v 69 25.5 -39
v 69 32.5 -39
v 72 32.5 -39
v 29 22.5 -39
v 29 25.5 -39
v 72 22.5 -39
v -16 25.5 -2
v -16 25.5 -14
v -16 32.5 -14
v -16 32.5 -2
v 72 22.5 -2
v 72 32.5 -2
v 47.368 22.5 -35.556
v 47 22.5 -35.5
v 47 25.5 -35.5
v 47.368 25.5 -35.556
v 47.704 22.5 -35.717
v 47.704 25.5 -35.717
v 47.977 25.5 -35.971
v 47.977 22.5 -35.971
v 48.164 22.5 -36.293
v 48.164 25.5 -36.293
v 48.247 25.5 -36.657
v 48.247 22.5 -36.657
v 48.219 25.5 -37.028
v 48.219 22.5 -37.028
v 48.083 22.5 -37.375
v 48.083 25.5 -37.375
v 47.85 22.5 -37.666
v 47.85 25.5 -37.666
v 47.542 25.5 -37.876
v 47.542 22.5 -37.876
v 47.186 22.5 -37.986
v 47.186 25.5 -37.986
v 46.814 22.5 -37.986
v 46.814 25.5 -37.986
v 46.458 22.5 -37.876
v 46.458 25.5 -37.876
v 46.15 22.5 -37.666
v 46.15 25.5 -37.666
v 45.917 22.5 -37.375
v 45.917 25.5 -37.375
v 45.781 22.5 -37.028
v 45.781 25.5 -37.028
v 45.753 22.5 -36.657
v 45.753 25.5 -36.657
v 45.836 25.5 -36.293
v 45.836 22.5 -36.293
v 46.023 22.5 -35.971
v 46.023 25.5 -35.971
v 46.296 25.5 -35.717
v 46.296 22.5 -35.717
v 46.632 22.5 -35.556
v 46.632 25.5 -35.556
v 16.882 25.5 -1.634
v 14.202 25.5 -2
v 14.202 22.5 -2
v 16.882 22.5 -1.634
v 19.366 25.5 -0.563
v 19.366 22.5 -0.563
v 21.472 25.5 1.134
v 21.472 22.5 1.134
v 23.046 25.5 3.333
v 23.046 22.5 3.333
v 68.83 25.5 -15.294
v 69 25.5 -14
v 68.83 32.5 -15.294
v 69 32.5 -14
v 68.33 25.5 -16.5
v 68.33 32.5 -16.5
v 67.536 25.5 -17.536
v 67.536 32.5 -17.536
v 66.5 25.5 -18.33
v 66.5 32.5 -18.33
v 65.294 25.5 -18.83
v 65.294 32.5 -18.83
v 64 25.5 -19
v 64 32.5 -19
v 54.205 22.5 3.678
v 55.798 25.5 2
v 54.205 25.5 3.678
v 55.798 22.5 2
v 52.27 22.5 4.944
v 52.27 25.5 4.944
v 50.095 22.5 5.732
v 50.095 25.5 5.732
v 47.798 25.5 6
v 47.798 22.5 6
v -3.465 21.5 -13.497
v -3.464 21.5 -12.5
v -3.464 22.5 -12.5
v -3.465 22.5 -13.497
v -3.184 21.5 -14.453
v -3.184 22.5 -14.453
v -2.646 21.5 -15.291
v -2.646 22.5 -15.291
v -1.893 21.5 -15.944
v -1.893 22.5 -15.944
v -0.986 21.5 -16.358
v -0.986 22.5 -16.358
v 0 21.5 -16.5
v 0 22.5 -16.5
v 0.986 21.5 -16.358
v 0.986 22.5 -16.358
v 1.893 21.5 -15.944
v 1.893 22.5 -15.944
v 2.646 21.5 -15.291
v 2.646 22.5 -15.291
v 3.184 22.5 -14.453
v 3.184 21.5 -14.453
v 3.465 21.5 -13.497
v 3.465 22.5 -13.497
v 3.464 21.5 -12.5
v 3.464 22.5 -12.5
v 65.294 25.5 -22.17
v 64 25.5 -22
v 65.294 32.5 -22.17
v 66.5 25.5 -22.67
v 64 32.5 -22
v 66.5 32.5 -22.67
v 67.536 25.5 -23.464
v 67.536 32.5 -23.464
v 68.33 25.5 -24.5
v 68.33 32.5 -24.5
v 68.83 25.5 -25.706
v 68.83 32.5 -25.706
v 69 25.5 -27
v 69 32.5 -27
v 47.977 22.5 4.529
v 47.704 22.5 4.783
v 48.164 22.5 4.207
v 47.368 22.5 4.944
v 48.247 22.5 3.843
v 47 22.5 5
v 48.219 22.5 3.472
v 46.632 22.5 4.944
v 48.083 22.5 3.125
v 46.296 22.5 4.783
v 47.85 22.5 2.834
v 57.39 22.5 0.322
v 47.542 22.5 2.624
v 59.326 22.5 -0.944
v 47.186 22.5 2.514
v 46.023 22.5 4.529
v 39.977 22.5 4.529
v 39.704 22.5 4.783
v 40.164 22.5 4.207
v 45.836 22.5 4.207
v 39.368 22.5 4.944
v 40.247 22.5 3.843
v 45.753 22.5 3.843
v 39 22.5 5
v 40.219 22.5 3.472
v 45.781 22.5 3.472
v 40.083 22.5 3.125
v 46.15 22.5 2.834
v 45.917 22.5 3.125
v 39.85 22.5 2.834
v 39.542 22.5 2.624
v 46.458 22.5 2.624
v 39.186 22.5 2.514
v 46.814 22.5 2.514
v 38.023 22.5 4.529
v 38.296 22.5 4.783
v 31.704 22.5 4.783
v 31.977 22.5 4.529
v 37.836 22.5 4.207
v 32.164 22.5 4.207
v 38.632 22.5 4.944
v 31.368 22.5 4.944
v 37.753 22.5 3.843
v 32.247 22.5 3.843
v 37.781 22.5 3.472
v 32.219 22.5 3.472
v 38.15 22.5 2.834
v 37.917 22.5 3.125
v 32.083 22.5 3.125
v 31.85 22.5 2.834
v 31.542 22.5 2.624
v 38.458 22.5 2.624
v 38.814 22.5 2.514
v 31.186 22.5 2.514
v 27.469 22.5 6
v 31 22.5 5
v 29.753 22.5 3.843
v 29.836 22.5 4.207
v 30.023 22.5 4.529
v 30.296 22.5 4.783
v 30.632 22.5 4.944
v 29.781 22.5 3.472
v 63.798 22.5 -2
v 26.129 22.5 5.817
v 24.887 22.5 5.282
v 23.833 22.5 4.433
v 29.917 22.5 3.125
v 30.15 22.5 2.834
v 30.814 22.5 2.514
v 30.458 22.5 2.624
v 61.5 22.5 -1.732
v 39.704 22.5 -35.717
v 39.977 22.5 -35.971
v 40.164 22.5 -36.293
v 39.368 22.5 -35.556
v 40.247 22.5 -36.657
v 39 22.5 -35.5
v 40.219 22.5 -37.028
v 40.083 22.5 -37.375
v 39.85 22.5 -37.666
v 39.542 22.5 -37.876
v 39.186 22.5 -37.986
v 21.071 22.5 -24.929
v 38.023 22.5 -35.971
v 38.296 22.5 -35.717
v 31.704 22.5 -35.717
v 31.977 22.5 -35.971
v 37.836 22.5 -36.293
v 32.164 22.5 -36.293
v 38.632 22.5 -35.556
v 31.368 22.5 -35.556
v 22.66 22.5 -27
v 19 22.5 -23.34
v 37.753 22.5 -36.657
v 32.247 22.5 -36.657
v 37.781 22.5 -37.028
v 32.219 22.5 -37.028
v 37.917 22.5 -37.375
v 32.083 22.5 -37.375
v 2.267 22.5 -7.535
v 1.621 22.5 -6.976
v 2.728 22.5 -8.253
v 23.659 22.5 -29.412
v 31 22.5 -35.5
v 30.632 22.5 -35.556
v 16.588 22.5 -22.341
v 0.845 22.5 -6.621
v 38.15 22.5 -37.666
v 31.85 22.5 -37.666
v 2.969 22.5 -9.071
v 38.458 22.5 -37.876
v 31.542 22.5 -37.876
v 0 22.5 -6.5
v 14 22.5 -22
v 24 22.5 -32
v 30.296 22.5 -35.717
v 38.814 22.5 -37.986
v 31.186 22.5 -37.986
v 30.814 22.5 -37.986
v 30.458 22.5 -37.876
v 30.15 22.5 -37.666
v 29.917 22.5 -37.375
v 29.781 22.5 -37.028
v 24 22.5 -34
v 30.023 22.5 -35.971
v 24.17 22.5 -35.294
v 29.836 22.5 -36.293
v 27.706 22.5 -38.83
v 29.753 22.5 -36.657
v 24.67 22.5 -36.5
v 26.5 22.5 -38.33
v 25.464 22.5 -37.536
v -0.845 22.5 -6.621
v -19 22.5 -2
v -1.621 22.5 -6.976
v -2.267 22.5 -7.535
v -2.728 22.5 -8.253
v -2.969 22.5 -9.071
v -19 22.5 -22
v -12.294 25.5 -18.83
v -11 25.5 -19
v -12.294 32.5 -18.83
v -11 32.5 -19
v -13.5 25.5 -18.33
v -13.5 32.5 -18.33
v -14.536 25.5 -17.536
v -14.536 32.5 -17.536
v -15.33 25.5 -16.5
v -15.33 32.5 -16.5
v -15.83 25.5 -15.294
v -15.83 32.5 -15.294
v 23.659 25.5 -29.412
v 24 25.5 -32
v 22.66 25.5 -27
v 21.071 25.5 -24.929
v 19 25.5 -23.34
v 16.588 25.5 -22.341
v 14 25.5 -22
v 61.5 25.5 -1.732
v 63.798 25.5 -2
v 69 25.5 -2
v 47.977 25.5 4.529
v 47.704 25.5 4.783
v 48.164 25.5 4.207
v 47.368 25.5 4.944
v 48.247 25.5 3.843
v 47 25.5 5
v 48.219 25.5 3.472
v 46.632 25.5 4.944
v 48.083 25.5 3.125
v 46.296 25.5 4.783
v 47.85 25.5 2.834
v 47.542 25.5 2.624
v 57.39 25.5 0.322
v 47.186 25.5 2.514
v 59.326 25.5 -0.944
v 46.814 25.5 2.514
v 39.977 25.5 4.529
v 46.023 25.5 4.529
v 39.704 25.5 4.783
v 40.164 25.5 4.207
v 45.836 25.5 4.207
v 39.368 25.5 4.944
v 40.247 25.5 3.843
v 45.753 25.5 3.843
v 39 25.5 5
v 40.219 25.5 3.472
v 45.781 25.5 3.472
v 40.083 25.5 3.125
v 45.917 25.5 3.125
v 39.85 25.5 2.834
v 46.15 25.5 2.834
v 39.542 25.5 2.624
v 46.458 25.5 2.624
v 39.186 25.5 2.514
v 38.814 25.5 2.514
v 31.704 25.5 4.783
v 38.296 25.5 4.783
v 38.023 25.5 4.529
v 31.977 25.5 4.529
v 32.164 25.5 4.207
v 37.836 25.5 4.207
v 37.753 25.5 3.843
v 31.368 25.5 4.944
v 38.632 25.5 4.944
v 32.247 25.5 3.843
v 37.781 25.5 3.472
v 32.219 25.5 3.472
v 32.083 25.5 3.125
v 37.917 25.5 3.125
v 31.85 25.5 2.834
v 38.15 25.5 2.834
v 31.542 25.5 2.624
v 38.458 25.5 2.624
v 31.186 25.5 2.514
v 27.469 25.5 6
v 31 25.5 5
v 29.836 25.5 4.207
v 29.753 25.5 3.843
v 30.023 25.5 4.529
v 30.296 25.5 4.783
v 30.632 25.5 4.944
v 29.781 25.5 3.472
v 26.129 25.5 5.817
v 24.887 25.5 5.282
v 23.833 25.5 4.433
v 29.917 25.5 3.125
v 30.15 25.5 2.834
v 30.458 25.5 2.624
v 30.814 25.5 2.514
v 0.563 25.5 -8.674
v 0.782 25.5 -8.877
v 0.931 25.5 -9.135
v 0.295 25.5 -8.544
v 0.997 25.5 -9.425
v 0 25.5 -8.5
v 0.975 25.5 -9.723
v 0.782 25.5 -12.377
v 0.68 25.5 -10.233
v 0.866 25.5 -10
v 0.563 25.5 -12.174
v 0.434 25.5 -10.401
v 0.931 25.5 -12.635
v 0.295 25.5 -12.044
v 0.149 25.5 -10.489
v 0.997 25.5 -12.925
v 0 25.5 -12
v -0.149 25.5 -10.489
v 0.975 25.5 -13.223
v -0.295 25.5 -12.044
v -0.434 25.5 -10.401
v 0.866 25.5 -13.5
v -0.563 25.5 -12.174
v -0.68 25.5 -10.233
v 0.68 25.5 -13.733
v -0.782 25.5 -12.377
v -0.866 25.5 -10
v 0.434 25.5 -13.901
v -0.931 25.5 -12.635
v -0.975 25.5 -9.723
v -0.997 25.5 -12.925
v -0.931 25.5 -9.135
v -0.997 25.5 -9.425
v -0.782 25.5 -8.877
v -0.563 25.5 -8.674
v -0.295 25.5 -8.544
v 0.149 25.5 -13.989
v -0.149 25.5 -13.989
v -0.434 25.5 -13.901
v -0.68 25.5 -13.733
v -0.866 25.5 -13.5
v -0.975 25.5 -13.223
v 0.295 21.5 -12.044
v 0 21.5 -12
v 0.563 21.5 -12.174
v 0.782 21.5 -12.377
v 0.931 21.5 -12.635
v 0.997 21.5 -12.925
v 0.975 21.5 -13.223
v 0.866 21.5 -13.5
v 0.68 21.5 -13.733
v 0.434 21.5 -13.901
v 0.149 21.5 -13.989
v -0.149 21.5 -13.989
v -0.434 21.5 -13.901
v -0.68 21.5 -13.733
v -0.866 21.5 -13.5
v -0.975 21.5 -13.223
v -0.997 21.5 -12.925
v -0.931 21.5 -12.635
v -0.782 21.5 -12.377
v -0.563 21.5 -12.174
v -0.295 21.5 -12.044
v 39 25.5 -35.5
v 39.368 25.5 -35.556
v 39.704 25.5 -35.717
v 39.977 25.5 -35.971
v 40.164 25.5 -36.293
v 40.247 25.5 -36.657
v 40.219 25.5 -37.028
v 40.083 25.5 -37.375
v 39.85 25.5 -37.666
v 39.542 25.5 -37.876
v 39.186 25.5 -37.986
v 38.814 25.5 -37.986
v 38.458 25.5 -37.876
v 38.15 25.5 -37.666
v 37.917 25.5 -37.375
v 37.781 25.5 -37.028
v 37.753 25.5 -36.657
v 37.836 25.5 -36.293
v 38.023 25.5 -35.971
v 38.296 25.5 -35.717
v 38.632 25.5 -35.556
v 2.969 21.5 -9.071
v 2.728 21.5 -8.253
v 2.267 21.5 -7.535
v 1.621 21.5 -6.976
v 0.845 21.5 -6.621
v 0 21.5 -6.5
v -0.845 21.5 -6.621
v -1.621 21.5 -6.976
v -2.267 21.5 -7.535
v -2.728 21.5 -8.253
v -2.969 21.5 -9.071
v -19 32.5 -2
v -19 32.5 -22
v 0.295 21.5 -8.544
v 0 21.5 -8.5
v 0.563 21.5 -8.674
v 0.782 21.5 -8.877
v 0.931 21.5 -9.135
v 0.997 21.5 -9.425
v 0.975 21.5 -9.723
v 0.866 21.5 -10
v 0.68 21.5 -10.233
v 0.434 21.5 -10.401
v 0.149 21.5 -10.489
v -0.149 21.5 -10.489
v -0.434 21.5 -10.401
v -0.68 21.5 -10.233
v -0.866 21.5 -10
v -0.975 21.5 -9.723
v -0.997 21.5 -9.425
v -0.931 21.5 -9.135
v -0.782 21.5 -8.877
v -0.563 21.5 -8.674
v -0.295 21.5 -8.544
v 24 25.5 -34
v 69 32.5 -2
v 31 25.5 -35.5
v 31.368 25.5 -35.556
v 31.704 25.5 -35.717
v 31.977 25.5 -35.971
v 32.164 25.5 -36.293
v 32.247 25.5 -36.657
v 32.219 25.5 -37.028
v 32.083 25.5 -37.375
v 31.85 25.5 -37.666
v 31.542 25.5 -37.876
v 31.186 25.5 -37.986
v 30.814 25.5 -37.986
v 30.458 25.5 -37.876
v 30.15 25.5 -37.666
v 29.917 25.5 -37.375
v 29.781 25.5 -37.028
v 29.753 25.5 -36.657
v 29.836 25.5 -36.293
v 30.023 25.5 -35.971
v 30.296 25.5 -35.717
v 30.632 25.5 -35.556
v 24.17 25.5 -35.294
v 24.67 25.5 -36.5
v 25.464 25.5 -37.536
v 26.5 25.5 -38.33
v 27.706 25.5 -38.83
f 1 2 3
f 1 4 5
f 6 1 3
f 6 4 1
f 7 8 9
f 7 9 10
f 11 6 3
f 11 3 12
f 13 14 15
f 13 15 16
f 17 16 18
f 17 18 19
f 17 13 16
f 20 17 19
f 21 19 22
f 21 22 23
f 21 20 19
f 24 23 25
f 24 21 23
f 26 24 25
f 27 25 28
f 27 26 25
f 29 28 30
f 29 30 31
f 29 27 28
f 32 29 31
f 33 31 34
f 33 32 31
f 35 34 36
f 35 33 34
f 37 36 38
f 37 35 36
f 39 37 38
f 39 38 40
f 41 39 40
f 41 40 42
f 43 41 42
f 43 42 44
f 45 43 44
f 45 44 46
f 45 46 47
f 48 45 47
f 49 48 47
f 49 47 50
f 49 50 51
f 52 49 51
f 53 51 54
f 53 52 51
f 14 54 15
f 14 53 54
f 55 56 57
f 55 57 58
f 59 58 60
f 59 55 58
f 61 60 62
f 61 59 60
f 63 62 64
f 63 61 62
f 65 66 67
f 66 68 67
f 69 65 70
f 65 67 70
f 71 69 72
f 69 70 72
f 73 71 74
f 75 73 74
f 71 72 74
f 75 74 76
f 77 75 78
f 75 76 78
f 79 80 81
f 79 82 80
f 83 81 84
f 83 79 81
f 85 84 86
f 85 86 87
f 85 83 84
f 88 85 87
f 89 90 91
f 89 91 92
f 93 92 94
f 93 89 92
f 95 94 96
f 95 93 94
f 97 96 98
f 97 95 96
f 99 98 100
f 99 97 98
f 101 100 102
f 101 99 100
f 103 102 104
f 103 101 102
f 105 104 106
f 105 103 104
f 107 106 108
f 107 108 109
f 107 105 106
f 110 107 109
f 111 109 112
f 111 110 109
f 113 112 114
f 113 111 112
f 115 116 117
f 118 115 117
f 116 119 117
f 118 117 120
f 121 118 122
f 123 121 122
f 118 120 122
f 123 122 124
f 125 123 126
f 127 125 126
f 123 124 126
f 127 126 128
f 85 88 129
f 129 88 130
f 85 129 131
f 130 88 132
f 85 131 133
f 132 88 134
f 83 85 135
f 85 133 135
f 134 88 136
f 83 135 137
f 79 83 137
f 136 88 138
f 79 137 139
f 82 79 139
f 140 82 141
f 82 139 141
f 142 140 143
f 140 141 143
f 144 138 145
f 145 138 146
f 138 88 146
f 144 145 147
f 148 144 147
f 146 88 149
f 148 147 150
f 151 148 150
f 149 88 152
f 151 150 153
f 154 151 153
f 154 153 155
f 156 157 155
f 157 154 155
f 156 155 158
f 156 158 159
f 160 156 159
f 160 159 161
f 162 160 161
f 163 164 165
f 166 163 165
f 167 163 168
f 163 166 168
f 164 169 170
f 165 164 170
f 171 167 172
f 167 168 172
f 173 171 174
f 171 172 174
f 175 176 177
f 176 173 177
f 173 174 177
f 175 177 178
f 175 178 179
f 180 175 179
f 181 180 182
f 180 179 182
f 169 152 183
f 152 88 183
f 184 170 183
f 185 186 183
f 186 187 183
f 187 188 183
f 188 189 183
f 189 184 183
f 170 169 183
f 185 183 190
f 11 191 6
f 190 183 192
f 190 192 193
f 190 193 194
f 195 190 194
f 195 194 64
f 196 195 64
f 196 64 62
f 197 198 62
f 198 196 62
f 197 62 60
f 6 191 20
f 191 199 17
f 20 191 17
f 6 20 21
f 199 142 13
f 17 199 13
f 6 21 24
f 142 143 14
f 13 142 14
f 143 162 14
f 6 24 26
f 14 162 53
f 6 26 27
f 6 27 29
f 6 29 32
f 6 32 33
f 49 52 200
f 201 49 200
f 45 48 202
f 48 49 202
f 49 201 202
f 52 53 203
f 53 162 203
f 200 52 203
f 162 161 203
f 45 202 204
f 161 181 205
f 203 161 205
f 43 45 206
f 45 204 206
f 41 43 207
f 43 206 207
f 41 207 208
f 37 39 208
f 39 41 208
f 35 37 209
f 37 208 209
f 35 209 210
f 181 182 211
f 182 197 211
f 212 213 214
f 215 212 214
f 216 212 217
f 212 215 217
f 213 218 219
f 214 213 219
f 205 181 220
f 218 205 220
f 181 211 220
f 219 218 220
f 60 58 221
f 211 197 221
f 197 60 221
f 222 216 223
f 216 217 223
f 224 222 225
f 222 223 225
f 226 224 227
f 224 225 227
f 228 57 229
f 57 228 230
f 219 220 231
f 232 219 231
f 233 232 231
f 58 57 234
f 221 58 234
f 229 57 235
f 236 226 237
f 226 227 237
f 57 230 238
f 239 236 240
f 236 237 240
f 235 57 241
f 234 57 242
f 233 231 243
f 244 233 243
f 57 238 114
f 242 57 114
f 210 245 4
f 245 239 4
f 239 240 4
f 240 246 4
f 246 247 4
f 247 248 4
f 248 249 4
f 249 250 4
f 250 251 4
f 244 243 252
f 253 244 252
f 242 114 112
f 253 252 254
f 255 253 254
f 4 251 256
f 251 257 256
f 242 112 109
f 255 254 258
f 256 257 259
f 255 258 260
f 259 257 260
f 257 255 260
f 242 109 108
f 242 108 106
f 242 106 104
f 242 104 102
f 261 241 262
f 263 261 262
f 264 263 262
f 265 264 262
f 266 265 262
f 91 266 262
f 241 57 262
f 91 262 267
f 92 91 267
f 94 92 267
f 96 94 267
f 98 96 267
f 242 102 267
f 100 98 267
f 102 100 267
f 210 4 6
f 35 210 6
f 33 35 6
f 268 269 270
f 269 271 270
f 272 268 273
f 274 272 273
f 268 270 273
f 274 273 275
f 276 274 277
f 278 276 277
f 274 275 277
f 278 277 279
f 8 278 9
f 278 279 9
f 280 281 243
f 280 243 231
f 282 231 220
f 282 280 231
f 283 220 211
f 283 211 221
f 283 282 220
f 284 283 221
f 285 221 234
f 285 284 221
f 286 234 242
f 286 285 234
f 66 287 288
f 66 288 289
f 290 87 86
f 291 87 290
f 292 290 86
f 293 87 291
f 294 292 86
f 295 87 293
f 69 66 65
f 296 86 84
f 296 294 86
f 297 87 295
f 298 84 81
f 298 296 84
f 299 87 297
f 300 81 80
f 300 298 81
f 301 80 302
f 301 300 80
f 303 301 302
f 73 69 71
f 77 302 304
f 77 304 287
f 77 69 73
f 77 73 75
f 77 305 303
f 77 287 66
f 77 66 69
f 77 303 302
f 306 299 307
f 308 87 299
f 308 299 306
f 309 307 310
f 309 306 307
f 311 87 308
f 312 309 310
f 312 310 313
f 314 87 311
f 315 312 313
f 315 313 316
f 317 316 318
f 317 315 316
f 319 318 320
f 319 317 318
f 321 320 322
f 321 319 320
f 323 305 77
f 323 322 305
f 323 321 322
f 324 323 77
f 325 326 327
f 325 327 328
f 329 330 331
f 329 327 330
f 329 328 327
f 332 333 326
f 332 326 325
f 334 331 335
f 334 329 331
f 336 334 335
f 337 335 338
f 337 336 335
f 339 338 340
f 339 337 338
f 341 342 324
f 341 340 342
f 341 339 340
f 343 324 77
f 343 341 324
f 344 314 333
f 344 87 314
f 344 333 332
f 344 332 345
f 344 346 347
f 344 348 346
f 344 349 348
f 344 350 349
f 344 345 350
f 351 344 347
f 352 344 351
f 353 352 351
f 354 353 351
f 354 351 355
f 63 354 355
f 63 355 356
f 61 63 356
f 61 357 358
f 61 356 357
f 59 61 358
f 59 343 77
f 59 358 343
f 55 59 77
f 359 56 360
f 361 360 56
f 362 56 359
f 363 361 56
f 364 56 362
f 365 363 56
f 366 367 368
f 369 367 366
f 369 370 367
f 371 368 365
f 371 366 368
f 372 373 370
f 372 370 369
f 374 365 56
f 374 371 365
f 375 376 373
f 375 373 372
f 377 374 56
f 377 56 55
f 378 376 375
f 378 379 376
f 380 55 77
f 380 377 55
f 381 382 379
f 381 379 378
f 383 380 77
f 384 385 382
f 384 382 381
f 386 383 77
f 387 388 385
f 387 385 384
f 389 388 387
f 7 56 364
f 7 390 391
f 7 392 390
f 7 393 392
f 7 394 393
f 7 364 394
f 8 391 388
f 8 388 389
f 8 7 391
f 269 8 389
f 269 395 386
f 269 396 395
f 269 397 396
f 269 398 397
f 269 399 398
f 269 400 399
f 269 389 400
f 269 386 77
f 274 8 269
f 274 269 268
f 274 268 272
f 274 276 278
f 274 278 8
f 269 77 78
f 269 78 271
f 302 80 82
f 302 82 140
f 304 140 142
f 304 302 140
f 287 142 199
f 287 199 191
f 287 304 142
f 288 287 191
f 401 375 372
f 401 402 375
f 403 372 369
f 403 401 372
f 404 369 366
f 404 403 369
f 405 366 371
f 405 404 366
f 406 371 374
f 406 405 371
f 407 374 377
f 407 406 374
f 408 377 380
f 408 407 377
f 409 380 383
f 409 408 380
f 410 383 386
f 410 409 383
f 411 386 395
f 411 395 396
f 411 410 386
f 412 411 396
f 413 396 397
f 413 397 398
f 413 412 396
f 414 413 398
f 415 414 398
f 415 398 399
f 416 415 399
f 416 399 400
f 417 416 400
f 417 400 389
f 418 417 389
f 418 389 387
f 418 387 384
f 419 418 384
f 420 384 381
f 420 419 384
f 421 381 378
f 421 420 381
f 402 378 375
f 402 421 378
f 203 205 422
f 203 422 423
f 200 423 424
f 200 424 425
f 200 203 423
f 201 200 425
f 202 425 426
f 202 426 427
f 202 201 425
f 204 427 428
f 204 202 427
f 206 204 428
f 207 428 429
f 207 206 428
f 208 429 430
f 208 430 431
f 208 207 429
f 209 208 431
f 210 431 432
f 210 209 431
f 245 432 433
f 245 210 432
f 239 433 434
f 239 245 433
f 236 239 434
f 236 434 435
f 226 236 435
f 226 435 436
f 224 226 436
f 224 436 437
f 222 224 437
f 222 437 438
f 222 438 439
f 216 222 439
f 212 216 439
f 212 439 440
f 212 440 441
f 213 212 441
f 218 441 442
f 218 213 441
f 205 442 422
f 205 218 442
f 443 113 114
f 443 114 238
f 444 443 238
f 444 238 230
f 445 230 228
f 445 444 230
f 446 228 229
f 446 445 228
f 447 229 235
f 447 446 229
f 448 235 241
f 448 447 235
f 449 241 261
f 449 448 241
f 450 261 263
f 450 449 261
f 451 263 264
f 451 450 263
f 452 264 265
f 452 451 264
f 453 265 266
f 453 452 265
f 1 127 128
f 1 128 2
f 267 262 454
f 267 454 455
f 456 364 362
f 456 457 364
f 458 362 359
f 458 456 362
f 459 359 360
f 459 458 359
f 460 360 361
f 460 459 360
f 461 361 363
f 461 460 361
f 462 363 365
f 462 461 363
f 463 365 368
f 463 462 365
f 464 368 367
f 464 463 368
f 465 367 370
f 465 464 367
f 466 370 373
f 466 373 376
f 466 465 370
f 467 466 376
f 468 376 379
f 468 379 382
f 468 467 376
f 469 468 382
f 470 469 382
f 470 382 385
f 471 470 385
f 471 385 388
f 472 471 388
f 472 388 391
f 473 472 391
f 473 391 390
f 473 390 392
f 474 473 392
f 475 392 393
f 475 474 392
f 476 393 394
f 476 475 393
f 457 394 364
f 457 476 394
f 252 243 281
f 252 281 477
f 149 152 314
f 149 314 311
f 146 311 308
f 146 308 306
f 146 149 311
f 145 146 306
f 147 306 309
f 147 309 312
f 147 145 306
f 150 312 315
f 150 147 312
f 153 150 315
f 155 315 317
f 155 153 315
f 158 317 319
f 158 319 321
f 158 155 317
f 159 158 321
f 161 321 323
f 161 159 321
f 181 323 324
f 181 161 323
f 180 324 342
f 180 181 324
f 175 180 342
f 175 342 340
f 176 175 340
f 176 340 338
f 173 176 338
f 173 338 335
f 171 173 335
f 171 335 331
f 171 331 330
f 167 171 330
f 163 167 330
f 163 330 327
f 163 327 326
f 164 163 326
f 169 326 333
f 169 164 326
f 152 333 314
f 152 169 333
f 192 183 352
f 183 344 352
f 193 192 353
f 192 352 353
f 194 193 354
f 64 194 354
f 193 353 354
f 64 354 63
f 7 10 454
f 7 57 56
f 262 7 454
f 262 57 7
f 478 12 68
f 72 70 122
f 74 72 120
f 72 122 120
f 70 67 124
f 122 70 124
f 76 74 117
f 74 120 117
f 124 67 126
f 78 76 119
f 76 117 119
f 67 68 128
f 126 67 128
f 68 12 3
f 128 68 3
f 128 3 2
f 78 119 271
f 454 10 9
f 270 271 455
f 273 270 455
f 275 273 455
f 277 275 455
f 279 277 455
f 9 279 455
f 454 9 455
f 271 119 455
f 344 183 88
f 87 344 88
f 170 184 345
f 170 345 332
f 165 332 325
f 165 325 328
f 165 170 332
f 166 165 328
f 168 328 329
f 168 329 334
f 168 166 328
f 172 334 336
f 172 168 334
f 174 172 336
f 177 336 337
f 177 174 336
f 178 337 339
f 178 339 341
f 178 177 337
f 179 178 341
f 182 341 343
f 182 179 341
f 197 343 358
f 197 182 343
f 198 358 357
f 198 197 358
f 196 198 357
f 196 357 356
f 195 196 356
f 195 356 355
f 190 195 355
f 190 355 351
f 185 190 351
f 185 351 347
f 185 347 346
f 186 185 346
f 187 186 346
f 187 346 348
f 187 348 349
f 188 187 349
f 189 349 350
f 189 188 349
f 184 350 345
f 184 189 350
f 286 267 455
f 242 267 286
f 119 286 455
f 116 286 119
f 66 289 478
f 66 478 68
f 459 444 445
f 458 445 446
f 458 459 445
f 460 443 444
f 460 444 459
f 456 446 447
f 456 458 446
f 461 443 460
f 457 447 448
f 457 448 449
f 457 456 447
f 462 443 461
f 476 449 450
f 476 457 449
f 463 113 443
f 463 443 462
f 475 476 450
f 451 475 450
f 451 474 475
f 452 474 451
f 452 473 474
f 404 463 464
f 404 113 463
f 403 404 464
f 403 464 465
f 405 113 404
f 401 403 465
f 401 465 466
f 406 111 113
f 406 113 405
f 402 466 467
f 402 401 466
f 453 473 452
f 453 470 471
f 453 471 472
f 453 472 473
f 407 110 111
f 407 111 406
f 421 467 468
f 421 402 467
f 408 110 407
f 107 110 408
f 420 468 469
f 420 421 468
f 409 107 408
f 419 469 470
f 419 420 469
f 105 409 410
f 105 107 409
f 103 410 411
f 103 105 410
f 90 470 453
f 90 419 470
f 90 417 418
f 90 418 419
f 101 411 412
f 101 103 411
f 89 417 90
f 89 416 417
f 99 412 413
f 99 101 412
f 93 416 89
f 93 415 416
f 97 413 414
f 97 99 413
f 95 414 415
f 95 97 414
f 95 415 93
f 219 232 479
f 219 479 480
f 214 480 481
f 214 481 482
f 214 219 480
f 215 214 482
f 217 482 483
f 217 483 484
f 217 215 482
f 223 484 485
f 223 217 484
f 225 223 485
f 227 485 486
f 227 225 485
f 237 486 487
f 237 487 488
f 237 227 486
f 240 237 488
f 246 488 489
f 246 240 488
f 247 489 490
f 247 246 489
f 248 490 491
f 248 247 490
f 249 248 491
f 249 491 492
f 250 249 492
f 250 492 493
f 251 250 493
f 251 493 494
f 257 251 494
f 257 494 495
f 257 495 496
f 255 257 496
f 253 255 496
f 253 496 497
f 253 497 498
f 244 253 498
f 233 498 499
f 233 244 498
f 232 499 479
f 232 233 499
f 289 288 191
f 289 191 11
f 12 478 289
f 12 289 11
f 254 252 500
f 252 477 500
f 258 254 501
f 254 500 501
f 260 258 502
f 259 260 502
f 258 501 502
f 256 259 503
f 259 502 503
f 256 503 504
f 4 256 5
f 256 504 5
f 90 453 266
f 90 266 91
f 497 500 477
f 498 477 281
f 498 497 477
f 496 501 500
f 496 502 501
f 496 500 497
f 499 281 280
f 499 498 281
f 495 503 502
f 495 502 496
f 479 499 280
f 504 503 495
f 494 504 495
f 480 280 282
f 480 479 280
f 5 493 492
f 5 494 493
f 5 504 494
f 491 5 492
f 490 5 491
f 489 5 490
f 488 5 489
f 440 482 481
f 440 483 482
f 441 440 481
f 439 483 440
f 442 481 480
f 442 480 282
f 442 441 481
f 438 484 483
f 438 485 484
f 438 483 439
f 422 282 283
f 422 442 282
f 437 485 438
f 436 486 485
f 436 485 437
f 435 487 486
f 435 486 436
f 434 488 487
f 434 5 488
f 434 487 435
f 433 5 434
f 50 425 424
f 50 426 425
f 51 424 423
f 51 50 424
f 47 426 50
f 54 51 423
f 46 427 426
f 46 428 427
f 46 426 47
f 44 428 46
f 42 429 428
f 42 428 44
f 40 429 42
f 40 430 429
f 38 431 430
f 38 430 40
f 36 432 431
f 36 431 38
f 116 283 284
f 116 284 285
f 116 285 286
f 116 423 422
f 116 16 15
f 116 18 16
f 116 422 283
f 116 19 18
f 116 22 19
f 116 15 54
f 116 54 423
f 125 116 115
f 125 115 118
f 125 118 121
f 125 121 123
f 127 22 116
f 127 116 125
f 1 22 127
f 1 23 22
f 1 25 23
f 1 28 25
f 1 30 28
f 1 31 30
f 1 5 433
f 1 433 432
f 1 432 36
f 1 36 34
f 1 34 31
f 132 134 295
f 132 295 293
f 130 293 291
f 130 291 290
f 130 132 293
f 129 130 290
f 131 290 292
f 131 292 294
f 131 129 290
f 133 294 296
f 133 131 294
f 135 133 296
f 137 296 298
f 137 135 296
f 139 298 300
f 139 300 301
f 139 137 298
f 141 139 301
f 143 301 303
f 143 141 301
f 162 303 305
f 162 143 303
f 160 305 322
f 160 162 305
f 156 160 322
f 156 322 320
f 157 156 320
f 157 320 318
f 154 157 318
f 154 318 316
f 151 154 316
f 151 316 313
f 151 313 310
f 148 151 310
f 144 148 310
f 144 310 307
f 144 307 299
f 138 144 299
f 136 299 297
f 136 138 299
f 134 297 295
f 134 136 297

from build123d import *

# Parameters (mm, degrees)
SKETCH1_W           = 30
SKETCH1_H           = 45
SKETCH1_R           = 1.25
LASER_IF_DEPTH      = 3
SKETCH4_R           = 1
VLS_IF_TOP_DEPTH    = 4
SKETCH5_W           = 43
SKETCH5_H           = 20
SKETCH5_R           = 1
SKETCH5_W_2         = 18
SKETCH5_H_2         = 45
BOSS_EXTRUDE1_DEPTH = 3
FILLET1_R           = 10
FILLET2_R           = 5
BOSS_EXTRUDE2_DEPTH = 7
FILLET3_R           = 5
SKETCH7_W           = 18
SKETCH7_H           = 8
CUT_EXTRUDE1_DEPTH  = 83.182723245
FILLET4_R           = 10
FILLET5_R           = 10


with BuildPart() as part:
    # Sketch1 → LASER IF (new body)
    with BuildSketch(Plane(origin=(0, 22.5, 0), x_dir=(1, 0, 0), z_dir=(0, 1, 0))):
        with Locations((39, 16.5)):
            Rectangle(SKETCH1_W, SKETCH1_H)
        with Locations(Location((47, -3.75, 0), (0, 0, 270))):
            Circle(SKETCH1_R, mode=Mode.SUBTRACT)
        with Locations(Location((39, -3.75, 0), (0, 0, 270))):
            Circle(SKETCH1_R, mode=Mode.SUBTRACT)
        with Locations(Location((31, -3.75, 0), (0, 0, 270))):
            Circle(SKETCH1_R, mode=Mode.SUBTRACT)
        with Locations(Location((47, 36.75, 0), (0, 0, 270))):
            Circle(SKETCH1_R, mode=Mode.SUBTRACT)
        with Locations(Location((39, 36.75, 0), (0, 0, 270))):
            Circle(SKETCH1_R, mode=Mode.SUBTRACT)
        with Locations(Location((31, 36.75, 0), (0, 0, 270))):
            Circle(SKETCH1_R, mode=Mode.SUBTRACT)
    extrude(amount=LASER_IF_DEPTH)



with BuildPart() as body_2:
    # Sketch4 → VLS IF TOP (new body)
    with BuildSketch(Plane(origin=(0, 21.5, 0), x_dir=(1, 0, 0), z_dir=(0, 1, 0))):
        with BuildLine():
            Line((3.464101615, 12.5), (2.969229956, 9.071428571))
            ThreePointArc((2.969229956, 9.071428571), (0, 6.5), (-2.969229956, 9.071428571))
            Line((-2.969229956, 9.071428571), (-3.464101615, 12.5))
            ThreePointArc((-3.464101615, 12.5), (0, 16.5), (3.464101615, 12.5))
        make_face()
        with Locations(Location((0, 13, 0), (0, 0, 270))):
            Circle(SKETCH4_R, mode=Mode.SUBTRACT)
        with Locations(Location((0, 9.5, 0), (0, 0, 270))):
            Circle(SKETCH4_R, mode=Mode.SUBTRACT)
    extrude(amount=VLS_IF_TOP_DEPTH)


with BuildPart() as part_1:
    add(part.part)

    add(body_2.part)  # Boss-Extrude1 merges body 2
    # Sketch5 → Boss-Extrude1 (add)
    # profile 1 of 2: a face of its own
    with BuildSketch(Plane(origin=(0, 25.5, 0), x_dir=(1, 0, 0), z_dir=(0, 1, 0))):
        with Locations((2.5, 12)):
            Rectangle(SKETCH5_W, SKETCH5_H)
        with Locations(Location((0, 9.5, 0), (0, 0, 270))):
            Circle(SKETCH5_R, mode=Mode.SUBTRACT)
        with Locations(Location((0, 13, 0), (0, 0, 270))):
            Circle(SKETCH5_R, mode=Mode.SUBTRACT)
    # profile 2 of 2: a face of its own
    with BuildSketch(Plane(origin=(0, 25.5, 0), x_dir=(1, 0, 0), z_dir=(0, 1, 0))):
        with Locations((63, 16.5)):
            Rectangle(SKETCH5_W_2, SKETCH5_H_2)
    extrude(amount=-BOSS_EXTRUDE1_DEPTH)

    # Fillet1
    # the kernel refuses this fillet: 10 mm, written as the material it adds along each edge
    with BuildSketch(Plane(origin=(24, 25.5, -2), x_dir=(-1, 0, 0), z_dir=(0, -1, 0))) as fillet1_piece_1:
        with BuildLine():
            CenterArc((9.797958971, -10), FILLET1_R, 90, 78.463040967)
            Line((0, -8), (-0.195959179, -7.96))
            ThreePointArc((-0.195959179, -7.96), (-0.2, -4), (-0.2, 0))
            Line((-0.2, 0), (0, 0.2))
            Line((0, 0.2), (9.797958971, 0.2))
            Line((9.797958971, 0.2), (9.797958971, 0))
        make_face()
    extrude(amount=3)
    with BuildSketch(Plane(origin=(24, 25.5, -22), x_dir=(-1, 0, 0), z_dir=(0, -1, 0))) as fillet1_piece_2:
        with BuildLine():
            CenterArc((FILLET1_R, FILLET1_R), FILLET1_R, 180, 90)
            Line((0, FILLET1_R), (-FILLET1_R * 0.02, FILLET1_R))
            Line((-FILLET1_R * 0.02, FILLET1_R), (-FILLET1_R * 0.02, -FILLET1_R * 0.02))
            Line((-FILLET1_R * 0.02, -FILLET1_R * 0.02), (FILLET1_R, -FILLET1_R * 0.02))
            Line((FILLET1_R, -FILLET1_R * 0.02), (FILLET1_R, 0))
        make_face()
    extrude(amount=3)

    # Fillet2
    fillet2_edges = [part_1.edges().sort_by_distance(p)[0] for p in [
        (24, 24, -39),
        (24, 24, 6),
    ]]
    fillet(fillet2_edges, radius=FILLET2_R)

    # Sketch6 → Boss-Extrude2 (add)
    with BuildSketch(Plane(origin=(0, 25.5, 0), x_dir=(1, 0, 0), z_dir=(0, 1, 0))):
        Polygon((-16, 2), (-19, 2), (-19, 22), (69, 22), (69, 39), (72, 39), (72, 2), (69, 2), (69, 19), (-16, 19), align=None)
    extrude(amount=BOSS_EXTRUDE2_DEPTH)

    # Fillet3
    fillet3_edges = [part_1.edges().sort_by_distance(p)[0] for p in [
        (-16, 29, -19),
        (69, 29, -19),
        (69, 29, -22),
    ]]
    fillet(fillet3_edges, radius=FILLET3_R)

    # Sketch7 → Cut-Extrude1 (cut, through all)
    with BuildSketch(Plane(origin=(0, 25.5, 0), x_dir=(1, 0, 0), z_dir=(0, 1, 0))):
        with Locations((63, -2)):
            Rectangle(SKETCH7_W, SKETCH7_H)
    extrude(amount=-CUT_EXTRUDE1_DEPTH, mode=Mode.SUBTRACT)

    # Fillet4
    # the kernel refuses this fillet: 10 mm, written as the material it adds along each edge
    with BuildSketch(Plane(origin=(54, 25.5, -2), x_dir=(0, 0, 1), z_dir=(0, -1, 0))) as fillet4_piece_1:
        with BuildLine():
            CenterArc((10, -9.797958971), FILLET4_R, 101.536959033, 78.463040967)
            Line((0, -9.797958971), (-0.2, -9.797958971))
            Line((-0.2, -9.797958971), (-0.2, 0))
            Line((-0.2, 0), (0, 0.2))
            ThreePointArc((0, 0.2), (4, 0.2), (7.96, 0.195959179))
            Line((7.96, 0.195959179), (8, 0))
        make_face()
    extrude(amount=3)

    # Fillet5
    fillet5_edges = [part_1.edges().sort_by_distance(p)[0] for p in [
        (54, 24, 6),
    ]]
    fillet(fillet5_edges, radius=FILLET5_R)


solid = part_1.part
